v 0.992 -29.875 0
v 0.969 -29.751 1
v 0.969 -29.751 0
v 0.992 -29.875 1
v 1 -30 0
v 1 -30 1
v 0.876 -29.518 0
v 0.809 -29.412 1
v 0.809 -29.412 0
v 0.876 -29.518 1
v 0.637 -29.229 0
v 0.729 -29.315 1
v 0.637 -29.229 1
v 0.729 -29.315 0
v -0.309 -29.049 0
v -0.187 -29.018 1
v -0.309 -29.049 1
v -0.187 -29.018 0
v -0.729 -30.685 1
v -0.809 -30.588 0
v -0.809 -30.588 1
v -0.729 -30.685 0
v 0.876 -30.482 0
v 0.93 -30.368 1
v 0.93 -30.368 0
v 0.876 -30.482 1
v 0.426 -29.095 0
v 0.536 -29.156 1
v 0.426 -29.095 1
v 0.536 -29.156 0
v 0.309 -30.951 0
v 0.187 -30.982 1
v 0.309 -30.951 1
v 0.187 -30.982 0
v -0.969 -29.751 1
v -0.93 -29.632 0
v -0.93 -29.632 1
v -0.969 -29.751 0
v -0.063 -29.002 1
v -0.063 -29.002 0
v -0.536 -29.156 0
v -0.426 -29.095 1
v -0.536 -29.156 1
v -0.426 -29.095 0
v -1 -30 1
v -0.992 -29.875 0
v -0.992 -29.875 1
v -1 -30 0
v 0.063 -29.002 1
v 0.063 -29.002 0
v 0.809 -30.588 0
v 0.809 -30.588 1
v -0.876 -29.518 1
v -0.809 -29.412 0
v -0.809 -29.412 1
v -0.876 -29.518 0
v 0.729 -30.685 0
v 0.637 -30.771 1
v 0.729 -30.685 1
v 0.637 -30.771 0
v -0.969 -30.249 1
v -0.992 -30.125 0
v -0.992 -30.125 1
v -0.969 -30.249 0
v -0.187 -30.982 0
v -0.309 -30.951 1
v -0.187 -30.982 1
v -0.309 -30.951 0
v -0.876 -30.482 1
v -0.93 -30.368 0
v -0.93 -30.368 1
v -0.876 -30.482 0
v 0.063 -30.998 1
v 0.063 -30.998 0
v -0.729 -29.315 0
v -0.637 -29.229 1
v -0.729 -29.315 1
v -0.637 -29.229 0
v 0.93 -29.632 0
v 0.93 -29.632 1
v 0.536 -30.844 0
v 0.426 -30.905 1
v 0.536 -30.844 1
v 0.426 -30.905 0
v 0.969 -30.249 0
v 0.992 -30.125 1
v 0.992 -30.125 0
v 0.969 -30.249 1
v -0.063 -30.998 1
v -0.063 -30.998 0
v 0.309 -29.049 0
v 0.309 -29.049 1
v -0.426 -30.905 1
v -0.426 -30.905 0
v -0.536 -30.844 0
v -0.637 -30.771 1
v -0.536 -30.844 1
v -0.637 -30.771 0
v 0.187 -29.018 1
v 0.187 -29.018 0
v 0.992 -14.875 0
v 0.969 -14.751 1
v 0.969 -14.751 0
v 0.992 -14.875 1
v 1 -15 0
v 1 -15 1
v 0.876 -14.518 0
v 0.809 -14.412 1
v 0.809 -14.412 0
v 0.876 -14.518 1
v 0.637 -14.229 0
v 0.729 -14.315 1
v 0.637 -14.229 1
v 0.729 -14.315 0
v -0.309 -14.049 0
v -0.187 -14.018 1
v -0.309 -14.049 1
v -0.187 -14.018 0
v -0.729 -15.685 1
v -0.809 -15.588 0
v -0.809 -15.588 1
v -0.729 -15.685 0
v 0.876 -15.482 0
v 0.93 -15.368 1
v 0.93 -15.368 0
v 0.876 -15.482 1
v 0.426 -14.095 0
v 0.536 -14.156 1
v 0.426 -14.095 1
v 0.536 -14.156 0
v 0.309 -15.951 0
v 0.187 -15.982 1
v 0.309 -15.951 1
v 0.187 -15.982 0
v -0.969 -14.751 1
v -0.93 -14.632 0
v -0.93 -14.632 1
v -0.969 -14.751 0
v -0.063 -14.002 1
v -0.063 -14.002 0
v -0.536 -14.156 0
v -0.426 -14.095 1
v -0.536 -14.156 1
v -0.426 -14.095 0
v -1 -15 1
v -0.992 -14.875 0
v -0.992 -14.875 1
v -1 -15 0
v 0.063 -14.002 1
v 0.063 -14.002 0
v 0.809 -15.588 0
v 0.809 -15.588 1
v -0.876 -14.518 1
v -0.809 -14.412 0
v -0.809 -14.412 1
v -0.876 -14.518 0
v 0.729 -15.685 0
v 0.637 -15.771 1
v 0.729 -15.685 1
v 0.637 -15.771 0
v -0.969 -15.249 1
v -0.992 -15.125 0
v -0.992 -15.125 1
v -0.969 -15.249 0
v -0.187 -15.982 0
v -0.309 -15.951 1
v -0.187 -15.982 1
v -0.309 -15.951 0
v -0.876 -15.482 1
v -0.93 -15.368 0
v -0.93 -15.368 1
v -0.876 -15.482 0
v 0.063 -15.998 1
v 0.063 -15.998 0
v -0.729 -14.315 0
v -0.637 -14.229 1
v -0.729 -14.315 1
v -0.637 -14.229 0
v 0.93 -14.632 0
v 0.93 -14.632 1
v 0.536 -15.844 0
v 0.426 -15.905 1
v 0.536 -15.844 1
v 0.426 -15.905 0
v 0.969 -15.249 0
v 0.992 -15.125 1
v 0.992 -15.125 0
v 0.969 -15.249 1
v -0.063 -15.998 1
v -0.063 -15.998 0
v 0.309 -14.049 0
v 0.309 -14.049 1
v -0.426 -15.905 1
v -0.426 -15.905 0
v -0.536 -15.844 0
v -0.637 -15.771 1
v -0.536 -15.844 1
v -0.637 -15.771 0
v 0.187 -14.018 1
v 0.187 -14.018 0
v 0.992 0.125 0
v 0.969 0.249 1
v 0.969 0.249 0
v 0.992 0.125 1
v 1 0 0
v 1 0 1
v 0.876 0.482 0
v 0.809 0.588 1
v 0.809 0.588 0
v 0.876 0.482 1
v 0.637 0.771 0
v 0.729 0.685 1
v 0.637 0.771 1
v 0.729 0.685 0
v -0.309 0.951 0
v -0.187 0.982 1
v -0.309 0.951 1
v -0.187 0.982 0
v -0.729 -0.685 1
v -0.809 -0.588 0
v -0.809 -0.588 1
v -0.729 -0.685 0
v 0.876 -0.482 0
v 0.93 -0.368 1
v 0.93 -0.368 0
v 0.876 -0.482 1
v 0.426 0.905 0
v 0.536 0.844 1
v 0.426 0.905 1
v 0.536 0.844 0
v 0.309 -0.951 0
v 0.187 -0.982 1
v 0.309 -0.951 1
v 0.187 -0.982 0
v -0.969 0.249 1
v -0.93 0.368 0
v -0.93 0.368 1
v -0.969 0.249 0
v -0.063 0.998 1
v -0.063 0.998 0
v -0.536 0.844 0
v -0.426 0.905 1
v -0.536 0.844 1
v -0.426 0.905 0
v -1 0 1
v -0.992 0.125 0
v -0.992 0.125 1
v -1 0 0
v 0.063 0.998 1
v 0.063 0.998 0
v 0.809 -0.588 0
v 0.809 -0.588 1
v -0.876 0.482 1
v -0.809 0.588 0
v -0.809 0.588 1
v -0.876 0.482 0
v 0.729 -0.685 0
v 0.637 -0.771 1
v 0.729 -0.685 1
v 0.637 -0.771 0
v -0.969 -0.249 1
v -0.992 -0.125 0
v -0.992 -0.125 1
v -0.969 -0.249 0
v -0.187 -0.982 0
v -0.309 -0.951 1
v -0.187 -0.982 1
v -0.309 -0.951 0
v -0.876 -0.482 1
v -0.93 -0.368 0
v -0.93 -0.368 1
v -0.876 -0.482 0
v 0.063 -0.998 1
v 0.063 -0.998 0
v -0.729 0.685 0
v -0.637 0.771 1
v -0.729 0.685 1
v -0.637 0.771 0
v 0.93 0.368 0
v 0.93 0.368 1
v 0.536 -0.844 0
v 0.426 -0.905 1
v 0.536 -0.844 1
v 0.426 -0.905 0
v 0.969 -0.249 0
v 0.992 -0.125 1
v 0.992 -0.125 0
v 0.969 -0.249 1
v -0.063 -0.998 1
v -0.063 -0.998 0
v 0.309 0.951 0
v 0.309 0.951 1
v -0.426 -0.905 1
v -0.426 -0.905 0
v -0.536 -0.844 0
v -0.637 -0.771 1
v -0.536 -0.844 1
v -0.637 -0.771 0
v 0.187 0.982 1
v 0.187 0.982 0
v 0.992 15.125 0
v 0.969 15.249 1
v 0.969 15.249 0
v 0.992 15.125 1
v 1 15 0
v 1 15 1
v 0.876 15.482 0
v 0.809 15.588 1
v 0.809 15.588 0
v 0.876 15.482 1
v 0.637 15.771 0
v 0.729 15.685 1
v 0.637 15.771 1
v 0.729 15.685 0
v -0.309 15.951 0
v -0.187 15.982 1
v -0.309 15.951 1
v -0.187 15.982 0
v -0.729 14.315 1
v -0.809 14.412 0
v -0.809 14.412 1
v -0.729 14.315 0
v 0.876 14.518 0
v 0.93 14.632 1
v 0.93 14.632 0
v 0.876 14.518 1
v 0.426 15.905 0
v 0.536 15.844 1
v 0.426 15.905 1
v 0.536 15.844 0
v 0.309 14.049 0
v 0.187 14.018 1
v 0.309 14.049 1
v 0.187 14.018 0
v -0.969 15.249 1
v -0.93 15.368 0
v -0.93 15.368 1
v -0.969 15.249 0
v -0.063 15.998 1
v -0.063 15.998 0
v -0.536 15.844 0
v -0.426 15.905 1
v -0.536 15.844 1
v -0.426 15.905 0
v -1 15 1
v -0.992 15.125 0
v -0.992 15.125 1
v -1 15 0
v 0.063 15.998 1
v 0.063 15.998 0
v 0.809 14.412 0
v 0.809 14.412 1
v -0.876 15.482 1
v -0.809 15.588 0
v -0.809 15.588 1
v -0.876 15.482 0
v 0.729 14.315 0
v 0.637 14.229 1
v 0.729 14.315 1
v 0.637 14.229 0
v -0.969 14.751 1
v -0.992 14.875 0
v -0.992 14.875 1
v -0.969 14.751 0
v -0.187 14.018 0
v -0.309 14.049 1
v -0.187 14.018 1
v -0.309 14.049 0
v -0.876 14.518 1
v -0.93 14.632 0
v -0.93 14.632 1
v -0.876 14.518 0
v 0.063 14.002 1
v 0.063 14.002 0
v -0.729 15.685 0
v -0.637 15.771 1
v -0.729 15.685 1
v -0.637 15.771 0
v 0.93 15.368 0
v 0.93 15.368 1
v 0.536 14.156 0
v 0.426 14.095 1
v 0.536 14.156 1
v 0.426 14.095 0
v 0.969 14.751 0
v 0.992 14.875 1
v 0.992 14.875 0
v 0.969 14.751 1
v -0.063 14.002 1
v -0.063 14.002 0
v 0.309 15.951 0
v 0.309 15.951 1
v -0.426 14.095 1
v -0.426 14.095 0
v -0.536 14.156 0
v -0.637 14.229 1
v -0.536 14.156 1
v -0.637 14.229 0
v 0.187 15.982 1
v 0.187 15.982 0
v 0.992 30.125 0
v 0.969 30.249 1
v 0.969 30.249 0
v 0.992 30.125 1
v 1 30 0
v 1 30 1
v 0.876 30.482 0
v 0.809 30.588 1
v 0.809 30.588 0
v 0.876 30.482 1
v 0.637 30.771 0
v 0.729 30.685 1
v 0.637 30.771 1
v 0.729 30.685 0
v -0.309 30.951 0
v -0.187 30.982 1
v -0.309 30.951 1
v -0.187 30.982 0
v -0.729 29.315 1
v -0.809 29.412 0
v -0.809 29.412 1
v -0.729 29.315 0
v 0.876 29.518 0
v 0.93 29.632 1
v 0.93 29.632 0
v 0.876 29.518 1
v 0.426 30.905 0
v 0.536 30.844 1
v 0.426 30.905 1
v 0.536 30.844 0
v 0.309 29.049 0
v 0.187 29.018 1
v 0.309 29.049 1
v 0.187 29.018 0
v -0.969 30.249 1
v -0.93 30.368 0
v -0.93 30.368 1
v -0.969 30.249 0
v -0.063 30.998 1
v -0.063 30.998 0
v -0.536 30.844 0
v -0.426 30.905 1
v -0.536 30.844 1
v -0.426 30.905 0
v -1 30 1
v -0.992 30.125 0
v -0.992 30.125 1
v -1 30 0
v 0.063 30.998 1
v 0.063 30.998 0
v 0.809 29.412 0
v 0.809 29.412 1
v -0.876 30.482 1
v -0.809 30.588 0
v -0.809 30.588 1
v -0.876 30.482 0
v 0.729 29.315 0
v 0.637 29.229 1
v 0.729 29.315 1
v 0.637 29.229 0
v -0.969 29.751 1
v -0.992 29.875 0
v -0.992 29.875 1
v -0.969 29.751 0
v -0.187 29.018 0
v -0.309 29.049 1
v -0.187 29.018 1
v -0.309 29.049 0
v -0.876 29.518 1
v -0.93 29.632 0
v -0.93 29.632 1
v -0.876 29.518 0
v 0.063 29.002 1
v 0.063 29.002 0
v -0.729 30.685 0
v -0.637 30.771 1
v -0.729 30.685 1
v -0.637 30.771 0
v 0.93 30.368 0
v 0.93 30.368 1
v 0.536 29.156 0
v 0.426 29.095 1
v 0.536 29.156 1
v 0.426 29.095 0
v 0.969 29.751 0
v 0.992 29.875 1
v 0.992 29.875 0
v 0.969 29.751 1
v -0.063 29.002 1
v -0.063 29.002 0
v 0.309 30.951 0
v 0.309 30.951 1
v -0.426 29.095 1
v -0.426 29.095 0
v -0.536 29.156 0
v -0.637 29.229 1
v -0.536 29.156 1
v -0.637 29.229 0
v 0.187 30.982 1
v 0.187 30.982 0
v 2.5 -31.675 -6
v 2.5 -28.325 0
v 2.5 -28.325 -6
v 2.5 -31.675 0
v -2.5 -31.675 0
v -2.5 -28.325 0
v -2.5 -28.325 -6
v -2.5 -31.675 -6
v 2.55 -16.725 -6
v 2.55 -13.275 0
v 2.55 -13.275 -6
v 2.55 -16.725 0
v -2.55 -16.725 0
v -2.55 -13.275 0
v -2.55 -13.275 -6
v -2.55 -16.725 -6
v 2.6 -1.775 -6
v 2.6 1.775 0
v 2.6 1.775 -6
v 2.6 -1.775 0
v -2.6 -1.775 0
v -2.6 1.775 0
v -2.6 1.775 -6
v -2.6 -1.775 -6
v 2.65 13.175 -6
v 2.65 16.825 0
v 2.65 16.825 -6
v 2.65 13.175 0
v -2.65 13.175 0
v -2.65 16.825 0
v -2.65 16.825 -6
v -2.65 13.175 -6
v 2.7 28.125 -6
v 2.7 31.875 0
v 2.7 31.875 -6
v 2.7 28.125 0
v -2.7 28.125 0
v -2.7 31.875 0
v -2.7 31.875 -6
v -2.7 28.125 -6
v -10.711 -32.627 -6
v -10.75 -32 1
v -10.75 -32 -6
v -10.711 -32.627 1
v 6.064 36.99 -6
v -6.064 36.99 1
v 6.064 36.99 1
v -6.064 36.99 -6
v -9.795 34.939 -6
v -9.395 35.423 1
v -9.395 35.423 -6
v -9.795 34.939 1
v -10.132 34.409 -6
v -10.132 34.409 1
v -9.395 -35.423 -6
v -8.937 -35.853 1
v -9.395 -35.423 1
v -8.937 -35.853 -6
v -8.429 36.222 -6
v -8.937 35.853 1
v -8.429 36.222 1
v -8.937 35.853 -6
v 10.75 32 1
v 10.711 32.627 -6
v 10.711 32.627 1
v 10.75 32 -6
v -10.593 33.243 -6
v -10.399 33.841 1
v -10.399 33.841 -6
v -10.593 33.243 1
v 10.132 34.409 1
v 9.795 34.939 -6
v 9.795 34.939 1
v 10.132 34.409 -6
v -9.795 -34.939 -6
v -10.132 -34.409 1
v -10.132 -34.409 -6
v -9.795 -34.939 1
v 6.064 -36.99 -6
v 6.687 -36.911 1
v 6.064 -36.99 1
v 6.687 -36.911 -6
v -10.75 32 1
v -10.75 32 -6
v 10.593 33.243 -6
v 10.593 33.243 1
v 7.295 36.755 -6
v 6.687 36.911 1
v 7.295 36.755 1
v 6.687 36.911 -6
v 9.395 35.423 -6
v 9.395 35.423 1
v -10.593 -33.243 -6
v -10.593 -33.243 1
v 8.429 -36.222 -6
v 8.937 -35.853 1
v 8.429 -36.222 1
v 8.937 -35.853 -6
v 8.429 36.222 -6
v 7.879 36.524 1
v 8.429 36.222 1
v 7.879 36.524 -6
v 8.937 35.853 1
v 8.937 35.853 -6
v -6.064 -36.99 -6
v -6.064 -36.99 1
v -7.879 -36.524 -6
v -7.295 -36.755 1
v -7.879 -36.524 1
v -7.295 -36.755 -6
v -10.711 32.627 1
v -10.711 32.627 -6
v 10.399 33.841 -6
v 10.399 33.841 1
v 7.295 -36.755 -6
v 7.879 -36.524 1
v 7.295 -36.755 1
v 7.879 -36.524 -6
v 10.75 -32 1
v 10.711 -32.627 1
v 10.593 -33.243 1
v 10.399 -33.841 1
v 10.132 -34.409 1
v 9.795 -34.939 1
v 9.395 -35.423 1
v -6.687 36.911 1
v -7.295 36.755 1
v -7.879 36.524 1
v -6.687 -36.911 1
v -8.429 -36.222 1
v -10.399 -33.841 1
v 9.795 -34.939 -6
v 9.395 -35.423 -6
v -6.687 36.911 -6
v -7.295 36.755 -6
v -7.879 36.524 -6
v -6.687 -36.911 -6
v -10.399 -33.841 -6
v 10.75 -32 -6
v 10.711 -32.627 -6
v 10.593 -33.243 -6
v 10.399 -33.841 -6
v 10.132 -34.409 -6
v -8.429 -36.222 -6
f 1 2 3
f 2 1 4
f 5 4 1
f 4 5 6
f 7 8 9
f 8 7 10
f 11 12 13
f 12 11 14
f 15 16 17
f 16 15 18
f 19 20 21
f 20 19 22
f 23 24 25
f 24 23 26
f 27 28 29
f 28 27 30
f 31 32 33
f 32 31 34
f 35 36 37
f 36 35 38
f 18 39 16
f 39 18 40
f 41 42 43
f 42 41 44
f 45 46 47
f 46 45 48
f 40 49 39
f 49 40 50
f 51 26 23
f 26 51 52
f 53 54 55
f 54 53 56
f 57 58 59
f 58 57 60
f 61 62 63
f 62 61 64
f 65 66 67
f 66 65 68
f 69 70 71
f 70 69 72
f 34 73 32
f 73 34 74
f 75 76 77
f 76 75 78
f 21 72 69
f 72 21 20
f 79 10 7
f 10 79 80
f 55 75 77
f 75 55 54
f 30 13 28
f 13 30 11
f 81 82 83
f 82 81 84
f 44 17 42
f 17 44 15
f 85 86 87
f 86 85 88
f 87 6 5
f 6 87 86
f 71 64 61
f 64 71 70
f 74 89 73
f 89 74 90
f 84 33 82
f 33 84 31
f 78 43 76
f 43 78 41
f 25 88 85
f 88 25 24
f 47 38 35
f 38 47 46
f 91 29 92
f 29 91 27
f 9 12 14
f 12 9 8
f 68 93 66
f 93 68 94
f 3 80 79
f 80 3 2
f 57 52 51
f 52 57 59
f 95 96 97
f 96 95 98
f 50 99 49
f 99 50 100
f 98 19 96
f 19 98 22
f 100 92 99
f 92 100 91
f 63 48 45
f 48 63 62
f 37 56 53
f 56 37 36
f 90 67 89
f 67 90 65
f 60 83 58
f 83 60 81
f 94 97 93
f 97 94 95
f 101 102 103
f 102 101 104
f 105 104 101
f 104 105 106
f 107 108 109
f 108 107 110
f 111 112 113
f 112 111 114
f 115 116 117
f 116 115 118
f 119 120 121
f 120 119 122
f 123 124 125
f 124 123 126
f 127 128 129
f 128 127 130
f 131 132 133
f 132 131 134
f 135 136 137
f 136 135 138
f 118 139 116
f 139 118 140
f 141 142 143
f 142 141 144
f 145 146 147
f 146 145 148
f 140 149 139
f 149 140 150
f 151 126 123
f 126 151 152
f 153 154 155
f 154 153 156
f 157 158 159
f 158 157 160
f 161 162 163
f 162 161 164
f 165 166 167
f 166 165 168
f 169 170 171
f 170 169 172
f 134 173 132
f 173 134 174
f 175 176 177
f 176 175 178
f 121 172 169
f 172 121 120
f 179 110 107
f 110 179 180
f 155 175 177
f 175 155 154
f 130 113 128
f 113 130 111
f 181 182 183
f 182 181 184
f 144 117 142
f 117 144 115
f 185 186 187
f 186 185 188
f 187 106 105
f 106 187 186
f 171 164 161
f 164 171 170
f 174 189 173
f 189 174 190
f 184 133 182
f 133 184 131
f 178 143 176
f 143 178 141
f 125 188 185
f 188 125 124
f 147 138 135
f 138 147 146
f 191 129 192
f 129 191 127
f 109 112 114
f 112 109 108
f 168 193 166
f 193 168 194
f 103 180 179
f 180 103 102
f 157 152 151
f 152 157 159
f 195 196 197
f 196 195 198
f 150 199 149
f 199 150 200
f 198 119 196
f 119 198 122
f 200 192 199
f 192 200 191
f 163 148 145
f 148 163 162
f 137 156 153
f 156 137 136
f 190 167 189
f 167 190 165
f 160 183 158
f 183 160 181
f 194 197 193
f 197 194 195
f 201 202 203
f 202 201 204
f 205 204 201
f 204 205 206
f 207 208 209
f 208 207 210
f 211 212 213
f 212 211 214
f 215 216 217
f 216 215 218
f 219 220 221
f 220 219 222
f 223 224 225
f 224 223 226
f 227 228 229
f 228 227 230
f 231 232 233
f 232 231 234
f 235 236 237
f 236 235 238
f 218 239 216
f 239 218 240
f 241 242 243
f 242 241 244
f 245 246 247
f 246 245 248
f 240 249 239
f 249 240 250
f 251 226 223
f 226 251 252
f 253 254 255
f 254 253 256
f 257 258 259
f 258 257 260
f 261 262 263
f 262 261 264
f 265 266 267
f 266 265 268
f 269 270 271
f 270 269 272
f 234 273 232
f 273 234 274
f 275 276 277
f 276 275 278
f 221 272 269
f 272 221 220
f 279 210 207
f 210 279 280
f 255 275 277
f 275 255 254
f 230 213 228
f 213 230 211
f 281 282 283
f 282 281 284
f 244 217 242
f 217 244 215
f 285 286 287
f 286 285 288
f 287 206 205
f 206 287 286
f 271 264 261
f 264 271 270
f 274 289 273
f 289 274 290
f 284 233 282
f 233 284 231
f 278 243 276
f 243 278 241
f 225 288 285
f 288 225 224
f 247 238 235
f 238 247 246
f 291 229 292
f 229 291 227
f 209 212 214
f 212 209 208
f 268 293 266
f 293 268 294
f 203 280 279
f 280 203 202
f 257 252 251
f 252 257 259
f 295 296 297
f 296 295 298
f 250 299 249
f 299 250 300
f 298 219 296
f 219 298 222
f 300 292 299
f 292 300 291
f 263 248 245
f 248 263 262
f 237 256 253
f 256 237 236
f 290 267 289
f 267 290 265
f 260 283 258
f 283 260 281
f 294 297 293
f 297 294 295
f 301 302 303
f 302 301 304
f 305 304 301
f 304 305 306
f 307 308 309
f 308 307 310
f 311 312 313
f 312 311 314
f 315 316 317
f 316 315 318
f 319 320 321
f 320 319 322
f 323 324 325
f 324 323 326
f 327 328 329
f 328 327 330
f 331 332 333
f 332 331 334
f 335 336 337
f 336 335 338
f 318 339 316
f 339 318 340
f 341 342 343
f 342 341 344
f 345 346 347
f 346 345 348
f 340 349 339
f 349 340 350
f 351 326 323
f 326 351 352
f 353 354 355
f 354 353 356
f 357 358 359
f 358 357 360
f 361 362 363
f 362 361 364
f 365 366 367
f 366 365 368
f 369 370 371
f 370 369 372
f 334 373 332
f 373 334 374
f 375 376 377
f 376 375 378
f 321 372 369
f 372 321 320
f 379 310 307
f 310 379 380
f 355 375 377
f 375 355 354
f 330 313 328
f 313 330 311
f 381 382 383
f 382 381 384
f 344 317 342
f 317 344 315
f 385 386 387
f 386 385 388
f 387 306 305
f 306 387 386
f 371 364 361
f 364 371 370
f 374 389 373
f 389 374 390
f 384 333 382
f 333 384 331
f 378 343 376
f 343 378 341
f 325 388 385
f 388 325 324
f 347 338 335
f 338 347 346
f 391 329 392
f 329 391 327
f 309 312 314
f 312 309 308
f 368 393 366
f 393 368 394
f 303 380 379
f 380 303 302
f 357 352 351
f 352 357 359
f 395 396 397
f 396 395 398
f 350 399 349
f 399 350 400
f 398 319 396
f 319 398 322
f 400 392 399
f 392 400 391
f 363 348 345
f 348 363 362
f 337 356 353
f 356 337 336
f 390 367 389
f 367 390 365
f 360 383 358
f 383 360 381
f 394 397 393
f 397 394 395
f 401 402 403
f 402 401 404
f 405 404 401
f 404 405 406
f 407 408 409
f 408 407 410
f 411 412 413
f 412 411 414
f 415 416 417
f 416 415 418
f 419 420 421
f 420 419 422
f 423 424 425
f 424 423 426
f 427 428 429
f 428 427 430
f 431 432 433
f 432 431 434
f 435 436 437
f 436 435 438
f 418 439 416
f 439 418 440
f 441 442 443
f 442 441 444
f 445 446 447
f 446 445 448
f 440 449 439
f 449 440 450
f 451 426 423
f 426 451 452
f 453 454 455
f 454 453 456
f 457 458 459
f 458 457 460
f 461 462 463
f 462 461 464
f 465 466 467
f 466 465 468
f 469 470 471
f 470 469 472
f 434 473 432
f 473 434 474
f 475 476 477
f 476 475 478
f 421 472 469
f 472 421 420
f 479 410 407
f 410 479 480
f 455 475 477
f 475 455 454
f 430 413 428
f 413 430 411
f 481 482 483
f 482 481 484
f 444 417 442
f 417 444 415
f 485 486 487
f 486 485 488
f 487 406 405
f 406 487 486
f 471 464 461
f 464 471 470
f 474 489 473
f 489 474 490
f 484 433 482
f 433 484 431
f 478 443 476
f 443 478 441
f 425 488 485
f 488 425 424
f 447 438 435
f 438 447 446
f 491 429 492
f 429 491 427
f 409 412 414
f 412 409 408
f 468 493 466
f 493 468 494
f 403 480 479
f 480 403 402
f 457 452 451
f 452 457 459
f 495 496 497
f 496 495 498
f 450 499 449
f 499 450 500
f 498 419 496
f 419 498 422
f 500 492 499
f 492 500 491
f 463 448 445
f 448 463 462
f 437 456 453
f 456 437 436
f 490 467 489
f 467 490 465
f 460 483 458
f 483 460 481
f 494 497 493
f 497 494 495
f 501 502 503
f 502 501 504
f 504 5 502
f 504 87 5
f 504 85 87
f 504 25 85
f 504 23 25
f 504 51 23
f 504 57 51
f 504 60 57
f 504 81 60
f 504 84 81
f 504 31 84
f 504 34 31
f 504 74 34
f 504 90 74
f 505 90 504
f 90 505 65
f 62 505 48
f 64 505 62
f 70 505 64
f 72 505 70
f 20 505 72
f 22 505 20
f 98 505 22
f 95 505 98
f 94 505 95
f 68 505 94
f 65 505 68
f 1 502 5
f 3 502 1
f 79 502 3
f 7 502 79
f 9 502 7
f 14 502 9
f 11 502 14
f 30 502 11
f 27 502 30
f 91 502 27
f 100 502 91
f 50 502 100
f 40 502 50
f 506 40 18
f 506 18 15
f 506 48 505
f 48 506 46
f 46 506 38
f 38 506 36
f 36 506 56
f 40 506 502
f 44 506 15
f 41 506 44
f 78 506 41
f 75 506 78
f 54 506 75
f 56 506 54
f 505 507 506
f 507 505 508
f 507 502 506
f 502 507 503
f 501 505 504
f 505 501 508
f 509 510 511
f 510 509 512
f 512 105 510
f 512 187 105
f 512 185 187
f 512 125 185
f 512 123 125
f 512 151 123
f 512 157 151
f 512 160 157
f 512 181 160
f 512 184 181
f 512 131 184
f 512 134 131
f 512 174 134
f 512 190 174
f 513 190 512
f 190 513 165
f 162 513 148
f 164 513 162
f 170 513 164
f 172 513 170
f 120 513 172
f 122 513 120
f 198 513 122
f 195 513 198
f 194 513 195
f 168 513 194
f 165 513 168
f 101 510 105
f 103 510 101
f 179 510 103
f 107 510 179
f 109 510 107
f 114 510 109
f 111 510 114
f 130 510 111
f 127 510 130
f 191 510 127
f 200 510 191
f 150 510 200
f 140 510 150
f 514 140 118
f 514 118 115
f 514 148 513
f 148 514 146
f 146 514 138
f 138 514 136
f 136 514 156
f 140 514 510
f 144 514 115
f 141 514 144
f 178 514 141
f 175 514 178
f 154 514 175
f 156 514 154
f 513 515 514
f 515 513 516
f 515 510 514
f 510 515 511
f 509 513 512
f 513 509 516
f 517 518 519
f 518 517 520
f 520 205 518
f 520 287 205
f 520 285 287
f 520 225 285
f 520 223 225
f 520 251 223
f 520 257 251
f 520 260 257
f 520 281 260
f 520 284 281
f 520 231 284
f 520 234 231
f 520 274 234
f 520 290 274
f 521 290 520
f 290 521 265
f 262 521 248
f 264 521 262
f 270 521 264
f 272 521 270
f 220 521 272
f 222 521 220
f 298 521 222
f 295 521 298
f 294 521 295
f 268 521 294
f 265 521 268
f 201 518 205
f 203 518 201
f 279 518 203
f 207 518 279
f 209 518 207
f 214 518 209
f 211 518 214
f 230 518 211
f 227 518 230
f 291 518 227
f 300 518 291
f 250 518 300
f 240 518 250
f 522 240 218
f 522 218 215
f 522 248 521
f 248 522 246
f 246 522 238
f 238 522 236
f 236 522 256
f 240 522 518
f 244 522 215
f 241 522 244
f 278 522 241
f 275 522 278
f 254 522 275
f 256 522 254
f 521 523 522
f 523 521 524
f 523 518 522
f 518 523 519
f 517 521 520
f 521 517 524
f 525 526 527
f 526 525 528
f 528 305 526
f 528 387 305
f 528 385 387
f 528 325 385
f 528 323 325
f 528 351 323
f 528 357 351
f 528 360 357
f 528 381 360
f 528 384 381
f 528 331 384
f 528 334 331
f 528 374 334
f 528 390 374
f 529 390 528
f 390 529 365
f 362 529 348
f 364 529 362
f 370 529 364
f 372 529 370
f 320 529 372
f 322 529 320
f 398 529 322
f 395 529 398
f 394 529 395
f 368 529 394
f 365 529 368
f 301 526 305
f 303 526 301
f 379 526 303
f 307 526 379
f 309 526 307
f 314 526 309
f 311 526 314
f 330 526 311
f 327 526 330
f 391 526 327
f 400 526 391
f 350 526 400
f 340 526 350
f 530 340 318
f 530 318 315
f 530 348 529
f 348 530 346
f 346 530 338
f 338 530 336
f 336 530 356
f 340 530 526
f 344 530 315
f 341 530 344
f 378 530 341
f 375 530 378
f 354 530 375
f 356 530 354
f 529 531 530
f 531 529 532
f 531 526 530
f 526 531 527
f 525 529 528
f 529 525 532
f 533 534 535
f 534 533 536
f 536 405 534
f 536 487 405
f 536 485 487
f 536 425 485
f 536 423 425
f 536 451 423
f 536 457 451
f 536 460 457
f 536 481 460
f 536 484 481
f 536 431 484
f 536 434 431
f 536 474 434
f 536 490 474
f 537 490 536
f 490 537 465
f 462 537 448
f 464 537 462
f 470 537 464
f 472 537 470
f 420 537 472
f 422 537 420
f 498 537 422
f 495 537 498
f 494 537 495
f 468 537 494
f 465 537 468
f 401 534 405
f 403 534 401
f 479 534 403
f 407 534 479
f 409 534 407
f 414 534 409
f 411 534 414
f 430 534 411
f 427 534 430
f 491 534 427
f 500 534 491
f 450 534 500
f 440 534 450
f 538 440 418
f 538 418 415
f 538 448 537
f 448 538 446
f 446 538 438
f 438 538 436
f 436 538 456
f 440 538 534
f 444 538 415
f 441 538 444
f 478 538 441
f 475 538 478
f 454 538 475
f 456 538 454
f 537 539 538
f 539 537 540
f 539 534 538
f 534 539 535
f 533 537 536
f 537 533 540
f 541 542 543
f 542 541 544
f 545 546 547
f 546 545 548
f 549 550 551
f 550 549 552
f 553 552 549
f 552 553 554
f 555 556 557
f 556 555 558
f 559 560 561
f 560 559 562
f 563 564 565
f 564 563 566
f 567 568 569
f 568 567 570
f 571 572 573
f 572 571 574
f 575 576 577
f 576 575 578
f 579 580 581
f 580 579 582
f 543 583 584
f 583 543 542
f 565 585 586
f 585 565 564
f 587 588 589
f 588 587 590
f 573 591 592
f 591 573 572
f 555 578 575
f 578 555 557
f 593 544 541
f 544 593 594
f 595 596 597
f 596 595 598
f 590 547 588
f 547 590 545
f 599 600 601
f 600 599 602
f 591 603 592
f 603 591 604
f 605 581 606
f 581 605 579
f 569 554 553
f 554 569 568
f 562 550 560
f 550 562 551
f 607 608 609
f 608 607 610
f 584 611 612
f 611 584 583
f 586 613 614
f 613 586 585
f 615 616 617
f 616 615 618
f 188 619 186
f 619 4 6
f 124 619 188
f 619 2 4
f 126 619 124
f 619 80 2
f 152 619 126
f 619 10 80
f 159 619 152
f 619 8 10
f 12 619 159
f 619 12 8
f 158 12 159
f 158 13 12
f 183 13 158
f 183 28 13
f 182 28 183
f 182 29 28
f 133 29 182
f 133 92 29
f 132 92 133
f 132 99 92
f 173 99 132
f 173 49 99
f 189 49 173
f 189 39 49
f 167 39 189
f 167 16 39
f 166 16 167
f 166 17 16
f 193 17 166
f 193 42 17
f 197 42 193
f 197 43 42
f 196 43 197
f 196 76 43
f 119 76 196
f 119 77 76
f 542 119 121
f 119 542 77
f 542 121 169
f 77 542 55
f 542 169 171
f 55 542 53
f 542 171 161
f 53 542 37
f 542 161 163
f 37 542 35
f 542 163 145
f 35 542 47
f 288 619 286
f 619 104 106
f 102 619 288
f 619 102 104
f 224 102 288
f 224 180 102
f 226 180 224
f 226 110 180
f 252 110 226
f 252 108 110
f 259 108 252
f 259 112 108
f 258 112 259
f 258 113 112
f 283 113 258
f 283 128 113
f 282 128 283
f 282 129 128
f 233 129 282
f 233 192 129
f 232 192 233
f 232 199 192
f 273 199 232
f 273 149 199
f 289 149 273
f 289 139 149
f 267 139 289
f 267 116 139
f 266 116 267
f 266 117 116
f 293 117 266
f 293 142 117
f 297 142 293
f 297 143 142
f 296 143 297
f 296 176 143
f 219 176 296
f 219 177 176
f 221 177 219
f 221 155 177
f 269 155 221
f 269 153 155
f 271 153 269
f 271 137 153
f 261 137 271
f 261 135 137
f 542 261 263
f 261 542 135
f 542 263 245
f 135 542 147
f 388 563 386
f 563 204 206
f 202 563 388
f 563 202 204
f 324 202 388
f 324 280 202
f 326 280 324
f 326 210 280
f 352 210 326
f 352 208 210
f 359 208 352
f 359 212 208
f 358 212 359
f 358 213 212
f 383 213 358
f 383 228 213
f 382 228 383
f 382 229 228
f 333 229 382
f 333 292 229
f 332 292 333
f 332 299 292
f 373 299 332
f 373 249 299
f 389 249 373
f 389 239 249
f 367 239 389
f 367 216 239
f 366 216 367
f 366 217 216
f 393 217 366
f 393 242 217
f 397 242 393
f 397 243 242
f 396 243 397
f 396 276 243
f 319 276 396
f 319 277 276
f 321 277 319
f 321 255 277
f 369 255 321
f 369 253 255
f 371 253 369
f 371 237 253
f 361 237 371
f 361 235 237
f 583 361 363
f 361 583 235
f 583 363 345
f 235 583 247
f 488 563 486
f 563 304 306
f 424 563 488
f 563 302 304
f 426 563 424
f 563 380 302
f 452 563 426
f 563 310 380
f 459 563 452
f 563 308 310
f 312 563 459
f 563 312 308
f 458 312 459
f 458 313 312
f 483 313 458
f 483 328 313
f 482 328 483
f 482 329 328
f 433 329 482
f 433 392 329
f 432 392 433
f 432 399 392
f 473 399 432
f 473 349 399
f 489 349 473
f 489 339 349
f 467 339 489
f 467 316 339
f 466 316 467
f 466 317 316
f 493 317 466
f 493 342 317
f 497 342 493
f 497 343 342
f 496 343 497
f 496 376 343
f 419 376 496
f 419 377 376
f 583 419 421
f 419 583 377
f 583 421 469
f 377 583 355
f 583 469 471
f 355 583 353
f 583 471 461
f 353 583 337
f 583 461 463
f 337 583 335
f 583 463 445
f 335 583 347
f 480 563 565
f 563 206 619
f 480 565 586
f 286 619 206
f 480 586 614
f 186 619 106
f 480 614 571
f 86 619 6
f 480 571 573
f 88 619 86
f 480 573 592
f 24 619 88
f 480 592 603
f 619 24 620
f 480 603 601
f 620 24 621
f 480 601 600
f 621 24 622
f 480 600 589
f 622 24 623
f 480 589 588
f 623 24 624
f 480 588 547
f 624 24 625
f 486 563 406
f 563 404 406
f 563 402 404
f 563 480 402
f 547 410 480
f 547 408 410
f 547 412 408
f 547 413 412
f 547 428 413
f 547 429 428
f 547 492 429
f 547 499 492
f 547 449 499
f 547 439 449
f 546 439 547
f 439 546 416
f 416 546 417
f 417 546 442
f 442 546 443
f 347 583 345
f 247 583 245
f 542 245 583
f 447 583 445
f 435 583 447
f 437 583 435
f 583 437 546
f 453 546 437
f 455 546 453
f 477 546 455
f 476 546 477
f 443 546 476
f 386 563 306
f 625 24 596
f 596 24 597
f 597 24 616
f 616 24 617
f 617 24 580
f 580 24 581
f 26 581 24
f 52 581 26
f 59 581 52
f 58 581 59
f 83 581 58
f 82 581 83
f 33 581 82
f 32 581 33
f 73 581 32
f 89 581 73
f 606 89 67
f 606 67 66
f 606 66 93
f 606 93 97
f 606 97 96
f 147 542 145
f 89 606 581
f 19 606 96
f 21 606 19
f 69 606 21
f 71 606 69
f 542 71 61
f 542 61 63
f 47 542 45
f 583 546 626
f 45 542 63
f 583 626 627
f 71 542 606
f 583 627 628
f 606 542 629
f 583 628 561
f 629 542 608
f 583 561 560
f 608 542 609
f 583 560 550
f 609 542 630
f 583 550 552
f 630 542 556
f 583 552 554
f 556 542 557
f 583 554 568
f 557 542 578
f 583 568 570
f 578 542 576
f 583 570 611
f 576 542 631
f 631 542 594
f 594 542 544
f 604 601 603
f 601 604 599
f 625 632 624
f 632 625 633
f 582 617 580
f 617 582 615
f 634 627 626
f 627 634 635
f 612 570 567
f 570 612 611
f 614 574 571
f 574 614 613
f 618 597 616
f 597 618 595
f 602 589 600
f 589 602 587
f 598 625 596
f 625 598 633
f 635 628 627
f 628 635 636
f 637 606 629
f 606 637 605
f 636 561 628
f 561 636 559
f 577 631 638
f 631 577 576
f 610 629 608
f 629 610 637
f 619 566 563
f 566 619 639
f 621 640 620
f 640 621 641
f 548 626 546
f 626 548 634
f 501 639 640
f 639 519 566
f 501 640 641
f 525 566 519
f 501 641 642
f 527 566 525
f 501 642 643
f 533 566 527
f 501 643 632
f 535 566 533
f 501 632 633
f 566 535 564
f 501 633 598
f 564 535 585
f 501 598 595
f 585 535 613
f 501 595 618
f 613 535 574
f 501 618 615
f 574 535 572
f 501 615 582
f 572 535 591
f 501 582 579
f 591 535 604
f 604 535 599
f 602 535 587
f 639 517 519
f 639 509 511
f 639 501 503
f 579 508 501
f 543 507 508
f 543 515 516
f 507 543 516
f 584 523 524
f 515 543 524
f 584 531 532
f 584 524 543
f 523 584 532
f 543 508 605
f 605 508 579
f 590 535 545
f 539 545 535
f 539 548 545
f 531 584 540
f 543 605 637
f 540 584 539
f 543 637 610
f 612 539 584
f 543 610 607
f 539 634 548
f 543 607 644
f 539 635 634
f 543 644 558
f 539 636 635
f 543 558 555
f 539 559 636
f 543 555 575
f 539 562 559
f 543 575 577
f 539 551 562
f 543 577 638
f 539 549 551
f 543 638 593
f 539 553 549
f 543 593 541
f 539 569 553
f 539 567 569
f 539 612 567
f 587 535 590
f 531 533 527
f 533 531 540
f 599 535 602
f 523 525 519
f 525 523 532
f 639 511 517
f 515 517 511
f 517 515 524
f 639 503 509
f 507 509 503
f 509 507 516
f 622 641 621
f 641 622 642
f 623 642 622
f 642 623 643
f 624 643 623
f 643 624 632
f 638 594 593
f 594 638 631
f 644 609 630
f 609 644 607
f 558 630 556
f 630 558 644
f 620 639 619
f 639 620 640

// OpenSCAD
$fn = 50;


difference() {
	union() {
		*color(alpha = 1.0000000000, c = "gray") {
			translate(v = [0, 14, -6]) {
				linear_extrude(height = 5) {
					text(font = "Arial:style=Bold", halign = "center", size = 4.5000000000, text = "COMMENT description oobb_plate_shape_p_type_7_depth_0_0_-6_pos_1.5_width_5_height", valign = "center");
				}
			}
		}
		translate(v = [0, 0, -6]) {
			hull() {
				translate(v = [-5.7500000000, 32.0000000000, 0]) {
					cylinder(h = 7, r = 5);
				}
				translate(v = [5.7500000000, 32.0000000000, 0]) {
					cylinder(h = 7, r = 5);
				}
				translate(v = [-5.7500000000, -32.0000000000, 0]) {
					cylinder(h = 7, r = 5);
				}
				translate(v = [5.7500000000, -32.0000000000, 0]) {
					cylinder(h = 7, r = 5);
				}
			}
		}
		*color(alpha = 1.0000000000, c = "gray") {
			translate(v = [0, 21, 0]) {
				linear_extrude(height = 1) {
					text(font = "Arial:style=Bold", halign = "center", size = 4.5000000000, text = "COMMENT oobb_motor_tt_01_0_0", valign = "center");
				}
			}
		}
		*color(alpha = 1.0000000000, c = "gray") {
			translate(v = [0, 14, 0]) {
				linear_extrude(height = 1) {
					text(font = "Arial:style=Bold", halign = "center", size = 4.5000000000, text = " radius_extra : 0", valign = "center");
				}
			}
		}
		*color(alpha = 1.0000000000, c = "gray") {
			translate(v = [0, 36, 0]) {
				linear_extrude(height = 1) {
					text(font = "Arial:style=Bold", halign = "center", size = 4.5000000000, text = "COMMENT oobb_motor_tt_01_0.1_0.1", valign = "center");
				}
			}
		}
		*color(alpha = 1.0000000000, c = "gray") {
			translate(v = [0, 29, 0]) {
				linear_extrude(height = 1) {
					text(font = "Arial:style=Bold", halign = "center", size = 4.5000000000, text = " radius_extra : 0.1", valign = "center");
				}
			}
		}
		*color(alpha = 1.0000000000, c = "gray") {
			translate(v = [0, 51, 0]) {
				linear_extrude(height = 1) {
					text(font = "Arial:style=Bold", halign = "center", size = 4.5000000000, text = "COMMENT oobb_motor_tt_01_0.2_0.2", valign = "center");
				}
			}
		}
		*color(alpha = 1.0000000000, c = "gray") {
			translate(v = [0, 44, 0]) {
				linear_extrude(height = 1) {
					text(font = "Arial:style=Bold", halign = "center", size = 4.5000000000, text = " radius_extra : 0.2", valign = "center");
				}
			}
		}
		*color(alpha = 1.0000000000, c = "gray") {
			translate(v = [0, 66, 0]) {
				linear_extrude(height = 1) {
					text(font = "Arial:style=Bold", halign = "center", size = 4.5000000000, text = "COMMENT oobb_motor_tt_01_0.3_0.3", valign = "center");
				}
			}
		}
		*color(alpha = 1.0000000000, c = "gray") {
			translate(v = [0, 59, 0]) {
				linear_extrude(height = 1) {
					text(font = "Arial:style=Bold", halign = "center", size = 4.5000000000, text = " radius_extra : 0.3", valign = "center");
				}
			}
		}
		*color(alpha = 1.0000000000, c = "gray") {
			translate(v = [0, 81, 0]) {
				linear_extrude(height = 1) {
					text(font = "Arial:style=Bold", halign = "center", size = 4.5000000000, text = "COMMENT oobb_motor_tt_01_0.4_0.4", valign = "center");
				}
			}
		}
		*color(alpha = 1.0000000000, c = "gray") {
			translate(v = [0, 74, 0]) {
				linear_extrude(height = 1) {
					text(font = "Arial:style=Bold", halign = "center", size = 4.5000000000, text = " radius_extra : 0.4", valign = "center");
				}
			}
		}
	}
	union() {
		translate(v = [0, -30, 2]) {
			rotate(a = [0, 0, 0]) {
				difference() {
					union() {
						translate(v = [0, 0, -12.0000000000]) {
							cylinder(h = 12, r = 0.7500000000);
						}
						translate(v = [0, 0, -12.0000000000]) {
							cylinder(h = 12, r = 1.0000000000);
						}
						cylinder(h = 1.3000000000, r = 2.5000000000);
						translate(v = [0, 0, -12.0000000000]) {
							cylinder(h = 12, r = 0.7500000000);
						}
					}
					union();
				}
			}
		}
		translate(v = [0, -15, 2]) {
			rotate(a = [0, 0, 0]) {
				difference() {
					union() {
						translate(v = [0, 0, -12.0000000000]) {
							cylinder(h = 12, r = 0.7500000000);
						}
						translate(v = [0, 0, -12.0000000000]) {
							cylinder(h = 12, r = 1.0000000000);
						}
						cylinder(h = 1.3000000000, r = 2.5000000000);
						translate(v = [0, 0, -12.0000000000]) {
							cylinder(h = 12, r = 0.7500000000);
						}
					}
					union();
				}
			}
		}
		translate(v = [0, 0, 2]) {
			rotate(a = [0, 0, 0]) {
				difference() {
					union() {
						translate(v = [0, 0, -12.0000000000]) {
							cylinder(h = 12, r = 0.7500000000);
						}
						translate(v = [0, 0, -12.0000000000]) {
							cylinder(h = 12, r = 1.0000000000);
						}
						cylinder(h = 1.3000000000, r = 2.5000000000);
						translate(v = [0, 0, -12.0000000000]) {
							cylinder(h = 12, r = 0.7500000000);
						}
					}
					union();
				}
			}
		}
		translate(v = [0, 15, 2]) {
			rotate(a = [0, 0, 0]) {
				difference() {
					union() {
						translate(v = [0, 0, -12.0000000000]) {
							cylinder(h = 12, r = 0.7500000000);
						}
						translate(v = [0, 0, -12.0000000000]) {
							cylinder(h = 12, r = 1.0000000000);
						}
						cylinder(h = 1.3000000000, r = 2.5000000000);
						translate(v = [0, 0, -12.0000000000]) {
							cylinder(h = 12, r = 0.7500000000);
						}
					}
					union();
				}
			}
		}
		translate(v = [0, 30, 2]) {
			rotate(a = [0, 0, 0]) {
				difference() {
					union() {
						translate(v = [0, 0, -12.0000000000]) {
							cylinder(h = 12, r = 0.7500000000);
						}
						translate(v = [0, 0, -12.0000000000]) {
							cylinder(h = 12, r = 1.0000000000);
						}
						cylinder(h = 1.3000000000, r = 2.5000000000);
						translate(v = [0, 0, -12.0000000000]) {
							cylinder(h = 12, r = 0.7500000000);
						}
					}
					union();
				}
			}
		}
		*color(alpha = 1.0000000000, c = "gray") {
			translate(v = [0, 14, 0]) {
				linear_extrude(height = 1) {
					text(font = "Arial:style=Bold", halign = "center", size = 4.5000000000, text = "COMMENT description oobb_motor_tt_01_shape_n_type_50_depth_0_-30_0_pos_shaft_part_30_comment_shift_line_{}_extra_0_radius_extra", valign = "center");
				}
			}
		}
		translate(v = [-2.5000000000, -31.6750000000, -50]) {
			cube(size = [5.0000000000, 3.3500000000, 50]);
		}
		*color(alpha = 1.0000000000, c = "gray") {
			translate(v = [0, 29, 0]) {
				linear_extrude(height = 1) {
					text(font = "Arial:style=Bold", halign = "center", size = 4.5000000000, text = "COMMENT description oobb_motor_tt_01_shape_n_type_50_depth_0_-15_0_pos_shaft_part_30_comment_shift_line_{}_extra_0.1_radius_extra", valign = "center");
				}
			}
		}
		translate(v = [-2.5500000000, -16.7250000000, -50]) {
			cube(size = [5.1000000000, 3.4500000000, 50]);
		}
		*color(alpha = 1.0000000000, c = "gray") {
			translate(v = [0, 44, 0]) {
				linear_extrude(height = 1) {
					text(font = "Arial:style=Bold", halign = "center", size = 4.5000000000, text = "COMMENT description oobb_motor_tt_01_shape_n_type_50_depth_shaft_part_30_comment_shift_line_{}_extra_0.2_radius_extra", valign = "center");
				}
			}
		}
		translate(v = [-2.6000000000, -1.7750000000, -50]) {
			cube(size = [5.2000000000, 3.5500000000, 50]);
		}
		*color(alpha = 1.0000000000, c = "gray") {
			translate(v = [0, 59, 0]) {
				linear_extrude(height = 1) {
					text(font = "Arial:style=Bold", halign = "center", size = 4.5000000000, text = "COMMENT description oobb_motor_tt_01_shape_n_type_50_depth_0_15_0_pos_shaft_part_30_comment_shift_line_{}_extra_0.3_radius_extra", valign = "center");
				}
			}
		}
		translate(v = [-2.6500000000, 13.1750000000, -50]) {
			cube(size = [5.3000000000, 3.6500000000, 50]);
		}
		*color(alpha = 1.0000000000, c = "gray") {
			translate(v = [0, 74, 0]) {
				linear_extrude(height = 1) {
					text(font = "Arial:style=Bold", halign = "center", size = 4.5000000000, text = "COMMENT description oobb_motor_tt_01_shape_n_type_50_depth_0_30_0_pos_shaft_part_30_comment_shift_line_{}_extra_0.4_radius_extra", valign = "center");
				}
			}
		}
		translate(v = [-2.7000000000, 28.1250000000, -50]) {
			cube(size = [5.4000000000, 3.7500000000, 50]);
		}
	}
}
